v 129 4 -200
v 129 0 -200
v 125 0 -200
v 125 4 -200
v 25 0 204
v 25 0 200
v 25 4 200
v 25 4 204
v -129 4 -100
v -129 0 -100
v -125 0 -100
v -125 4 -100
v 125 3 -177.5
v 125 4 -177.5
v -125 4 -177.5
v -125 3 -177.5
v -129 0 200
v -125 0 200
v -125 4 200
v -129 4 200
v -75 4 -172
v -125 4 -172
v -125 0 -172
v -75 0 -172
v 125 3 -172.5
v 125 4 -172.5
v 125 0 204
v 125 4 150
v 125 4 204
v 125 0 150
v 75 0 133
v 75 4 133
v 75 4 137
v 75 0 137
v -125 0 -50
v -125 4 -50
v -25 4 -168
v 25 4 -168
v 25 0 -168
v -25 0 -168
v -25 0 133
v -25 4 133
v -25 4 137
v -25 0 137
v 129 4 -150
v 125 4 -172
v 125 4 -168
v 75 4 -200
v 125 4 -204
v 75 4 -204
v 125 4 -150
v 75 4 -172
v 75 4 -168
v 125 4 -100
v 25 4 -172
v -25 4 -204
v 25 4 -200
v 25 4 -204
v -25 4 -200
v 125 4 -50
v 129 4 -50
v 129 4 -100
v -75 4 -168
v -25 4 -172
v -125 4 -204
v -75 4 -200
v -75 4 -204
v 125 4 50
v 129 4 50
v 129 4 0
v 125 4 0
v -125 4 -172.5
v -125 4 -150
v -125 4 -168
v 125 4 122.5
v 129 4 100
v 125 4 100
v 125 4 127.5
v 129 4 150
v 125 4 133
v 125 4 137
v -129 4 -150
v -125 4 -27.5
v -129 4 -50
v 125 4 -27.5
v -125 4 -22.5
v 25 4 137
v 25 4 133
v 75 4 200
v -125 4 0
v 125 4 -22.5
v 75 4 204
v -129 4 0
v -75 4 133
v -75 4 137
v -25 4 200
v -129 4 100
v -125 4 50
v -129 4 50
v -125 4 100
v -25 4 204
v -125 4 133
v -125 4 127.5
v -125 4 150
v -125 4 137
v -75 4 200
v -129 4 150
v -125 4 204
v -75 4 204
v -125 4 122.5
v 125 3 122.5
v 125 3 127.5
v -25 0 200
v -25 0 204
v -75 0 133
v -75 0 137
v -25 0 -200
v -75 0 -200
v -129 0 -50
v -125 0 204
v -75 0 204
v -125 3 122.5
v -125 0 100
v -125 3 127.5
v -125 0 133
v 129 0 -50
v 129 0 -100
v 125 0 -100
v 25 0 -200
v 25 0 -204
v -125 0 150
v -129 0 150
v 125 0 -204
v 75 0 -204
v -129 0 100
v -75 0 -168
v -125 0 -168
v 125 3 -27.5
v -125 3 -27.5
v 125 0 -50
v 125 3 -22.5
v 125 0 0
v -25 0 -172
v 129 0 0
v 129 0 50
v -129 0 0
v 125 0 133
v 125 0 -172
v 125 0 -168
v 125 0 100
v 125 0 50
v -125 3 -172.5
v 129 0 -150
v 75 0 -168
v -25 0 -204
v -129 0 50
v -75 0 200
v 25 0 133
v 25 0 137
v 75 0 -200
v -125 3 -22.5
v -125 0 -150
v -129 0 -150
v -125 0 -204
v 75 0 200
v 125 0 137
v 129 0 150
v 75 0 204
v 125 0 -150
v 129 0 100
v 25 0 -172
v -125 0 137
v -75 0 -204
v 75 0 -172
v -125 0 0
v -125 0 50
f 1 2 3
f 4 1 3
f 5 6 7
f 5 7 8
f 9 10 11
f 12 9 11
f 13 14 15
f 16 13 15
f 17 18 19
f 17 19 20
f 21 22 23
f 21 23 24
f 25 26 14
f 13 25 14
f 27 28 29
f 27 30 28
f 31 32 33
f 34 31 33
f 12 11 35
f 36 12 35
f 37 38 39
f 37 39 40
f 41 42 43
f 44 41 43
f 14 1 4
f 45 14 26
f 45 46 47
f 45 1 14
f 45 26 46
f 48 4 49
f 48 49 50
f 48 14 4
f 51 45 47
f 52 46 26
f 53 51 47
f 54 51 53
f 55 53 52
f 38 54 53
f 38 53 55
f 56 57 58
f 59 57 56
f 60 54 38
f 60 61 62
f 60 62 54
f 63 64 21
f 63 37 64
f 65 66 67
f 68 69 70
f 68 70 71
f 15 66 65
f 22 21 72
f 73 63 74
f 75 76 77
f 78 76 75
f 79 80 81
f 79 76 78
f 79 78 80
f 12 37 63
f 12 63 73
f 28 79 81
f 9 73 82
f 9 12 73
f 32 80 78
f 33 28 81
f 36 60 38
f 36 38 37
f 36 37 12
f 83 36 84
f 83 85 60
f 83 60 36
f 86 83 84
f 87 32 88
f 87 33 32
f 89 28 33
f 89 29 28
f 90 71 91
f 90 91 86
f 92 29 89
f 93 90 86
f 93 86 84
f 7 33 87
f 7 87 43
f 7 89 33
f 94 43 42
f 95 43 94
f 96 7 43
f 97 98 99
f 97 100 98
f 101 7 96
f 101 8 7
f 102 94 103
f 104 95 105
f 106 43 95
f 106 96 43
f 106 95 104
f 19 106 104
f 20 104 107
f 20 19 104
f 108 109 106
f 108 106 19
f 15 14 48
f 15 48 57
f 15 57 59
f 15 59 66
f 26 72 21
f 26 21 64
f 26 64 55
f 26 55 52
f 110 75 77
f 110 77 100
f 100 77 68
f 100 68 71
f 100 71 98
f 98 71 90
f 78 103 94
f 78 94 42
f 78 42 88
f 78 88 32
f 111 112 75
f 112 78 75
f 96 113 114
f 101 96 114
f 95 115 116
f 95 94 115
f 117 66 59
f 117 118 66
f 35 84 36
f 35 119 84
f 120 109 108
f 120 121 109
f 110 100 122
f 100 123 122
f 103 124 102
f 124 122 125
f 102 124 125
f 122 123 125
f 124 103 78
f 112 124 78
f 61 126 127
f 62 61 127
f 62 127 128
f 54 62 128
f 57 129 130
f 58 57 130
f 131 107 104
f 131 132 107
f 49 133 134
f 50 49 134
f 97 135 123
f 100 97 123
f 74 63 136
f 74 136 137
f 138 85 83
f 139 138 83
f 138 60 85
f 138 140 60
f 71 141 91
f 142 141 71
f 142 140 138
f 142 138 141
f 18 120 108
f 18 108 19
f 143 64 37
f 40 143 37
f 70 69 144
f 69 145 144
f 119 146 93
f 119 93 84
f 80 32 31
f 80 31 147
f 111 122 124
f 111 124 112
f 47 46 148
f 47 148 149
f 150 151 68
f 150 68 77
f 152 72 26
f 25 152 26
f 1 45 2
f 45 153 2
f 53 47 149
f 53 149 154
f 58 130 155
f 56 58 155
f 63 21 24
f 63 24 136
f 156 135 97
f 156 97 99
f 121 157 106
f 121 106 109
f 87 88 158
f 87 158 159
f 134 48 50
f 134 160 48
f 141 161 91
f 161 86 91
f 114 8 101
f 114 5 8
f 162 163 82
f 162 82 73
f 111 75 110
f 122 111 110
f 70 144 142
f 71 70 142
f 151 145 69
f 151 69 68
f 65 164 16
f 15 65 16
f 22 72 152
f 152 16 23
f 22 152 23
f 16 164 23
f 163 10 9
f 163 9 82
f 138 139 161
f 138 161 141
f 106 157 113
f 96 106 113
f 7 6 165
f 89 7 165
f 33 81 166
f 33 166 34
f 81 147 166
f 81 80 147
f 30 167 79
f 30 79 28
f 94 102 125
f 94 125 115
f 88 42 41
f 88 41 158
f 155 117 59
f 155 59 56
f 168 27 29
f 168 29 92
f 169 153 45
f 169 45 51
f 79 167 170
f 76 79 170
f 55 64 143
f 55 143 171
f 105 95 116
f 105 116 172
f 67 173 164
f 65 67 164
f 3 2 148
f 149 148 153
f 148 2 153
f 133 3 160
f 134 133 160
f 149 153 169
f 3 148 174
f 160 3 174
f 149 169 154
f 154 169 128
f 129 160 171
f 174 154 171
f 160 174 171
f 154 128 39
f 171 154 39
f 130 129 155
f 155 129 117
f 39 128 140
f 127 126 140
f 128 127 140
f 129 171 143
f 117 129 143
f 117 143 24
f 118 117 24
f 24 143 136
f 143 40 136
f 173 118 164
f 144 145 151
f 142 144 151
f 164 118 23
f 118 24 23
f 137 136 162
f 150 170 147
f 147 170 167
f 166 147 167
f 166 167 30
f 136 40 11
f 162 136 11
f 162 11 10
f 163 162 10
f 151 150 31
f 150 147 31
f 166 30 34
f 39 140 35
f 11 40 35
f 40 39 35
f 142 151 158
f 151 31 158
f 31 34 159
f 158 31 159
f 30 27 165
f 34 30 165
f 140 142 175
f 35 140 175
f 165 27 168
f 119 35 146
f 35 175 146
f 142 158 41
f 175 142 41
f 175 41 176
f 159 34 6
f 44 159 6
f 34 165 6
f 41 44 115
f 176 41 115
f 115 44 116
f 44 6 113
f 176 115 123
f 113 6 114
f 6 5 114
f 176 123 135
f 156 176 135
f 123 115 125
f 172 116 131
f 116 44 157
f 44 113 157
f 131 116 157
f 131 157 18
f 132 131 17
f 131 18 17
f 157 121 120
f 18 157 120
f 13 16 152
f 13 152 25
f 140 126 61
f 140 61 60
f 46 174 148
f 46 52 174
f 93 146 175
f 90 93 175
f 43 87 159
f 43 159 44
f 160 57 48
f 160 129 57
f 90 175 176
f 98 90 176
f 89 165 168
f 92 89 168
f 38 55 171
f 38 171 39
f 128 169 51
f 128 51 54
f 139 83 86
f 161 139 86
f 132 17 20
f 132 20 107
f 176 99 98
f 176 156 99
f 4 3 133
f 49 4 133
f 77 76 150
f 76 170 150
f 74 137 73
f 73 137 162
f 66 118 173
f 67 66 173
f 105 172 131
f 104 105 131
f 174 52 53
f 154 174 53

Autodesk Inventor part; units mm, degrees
ref_plane "YZ Plane" through (0, 0, 0) normal (1, 0, 0) x (0, 1, 0)
ref_plane "XZ Plane" through (0, 0, 0) normal (0, 1, 0) x (-1, 0, 0)
ref_plane "XY Plane" through (0, 0, 0) normal (0, 0, 1) x (1, 0, 0)
sketch "Sketch1" plane through (0, 0, 0) normal (0, 1, 0) x (-1, 0, 0)
  line L0 (-125, 200) -> (125, 200) construction
  line L1 (125, 200) -> (125, -200) construction
  line L2 (125, -200) -> (-125, -200) construction
  line L3 (-125, -200) -> (-125, 200) construction
  line L4 (-125, 200) -> (125, -200) construction
  line L5 (125, 200) -> (-125, -200) construction
  line L6 (125, 200) -> (75, 200) construction
  line L7 (75, 200) -> (75, 204)
  line L8 (75, 204) -> (125, 204)
  line L9 (125, 204) -> (125, 200)
  line L10 (125, 200) -> (129, 200)
  line L11 (129, 200) -> (129, 150)
  line L12 (129, 150) -> (125, 150)
  line L13 (125, 150) -> (125, 200) construction
  line L14 (-125, 200) -> (-129, 200) construction
  line L15 (-129, 200) -> (-129, 150) construction
  line L16 (-129, 150) -> (-125, 150)
  line L17 (-125, 150) -> (-125, 200)
  line L18 (125, -200) -> (75, -200) construction
  line L19 (75, -200) -> (75, -204)
  line L20 (75, -204) -> (125, -204)
  line L21 (125, -204) -> (125, -200)
  line L22 (125, 100) -> (125, 150)
  line L23 (125, 150) -> (129, 150)
  line L24 (129, 100) -> (125, 100)
  line L25 (129, 150) -> (129, 100) construction
  line L26 (-125, 100) -> (-125, 150) construction
  line L27 (-125, 150) -> (-129, 150)
  line L28 (-129, 150) -> (-129, 100)
  line L29 (-129, 100) -> (-125, 100)
  line L30 (125, 50) -> (125, 100) construction
  line L31 (125, 100) -> (129, 100)
  line L32 (129, 50) -> (125, 50)
  line L33 (129, 100) -> (129, 50)
  line L34 (-125, 50) -> (-125, 100)
  line L35 (-125, 100) -> (-129, 100)
  line L36 (-129, 100) -> (-129, 50) construction
  line L37 (-129, 50) -> (-125, 50)
  line L38 (125, 0) -> (125, 50)
  line L39 (125, 50) -> (129, 50)
  line L40 (129, 0) -> (125, 0)
  line L41 (129, 50) -> (129, 0) construction
  line L42 (-125, 0) -> (-125, 50) construction
  line L43 (-125, 50) -> (-129, 50)
  line L44 (-129, 50) -> (-129, 0)
  line L45 (-129, 0) -> (-125, 0)
  line L46 (125, -50) -> (125, 0) construction
  line L47 (125, 0) -> (129, 0)
  line L48 (129, -50) -> (125, -50)
  line L49 (129, 0) -> (129, -50)
  line L50 (-125, -50) -> (-125, 0)
  line L51 (-125, 0) -> (-129, 0)
  line L52 (-129, 0) -> (-129, -50) construction
  line L53 (-129, -50) -> (-125, -50)
  line L54 (125, -100) -> (125, -50)
  line L55 (125, -50) -> (129, -50)
  line L56 (129, -100) -> (125, -100)
  line L57 (129, -50) -> (129, -100) construction
  line L58 (-125, -100) -> (-125, -50) construction
  line L59 (-125, -50) -> (-129, -50)
  line L60 (-129, -50) -> (-129, -100)
  line L61 (-129, -100) -> (-125, -100)
  line L62 (125, -150) -> (125, -100) construction
  line L63 (125, -100) -> (129, -100)
  line L64 (129, -150) -> (125, -150)
  line L65 (129, -100) -> (129, -150)
  line L66 (-125, -150) -> (-125, -100)
  line L67 (-125, -100) -> (-129, -100)
  line L68 (-129, -100) -> (-129, -150) construction
  line L69 (-129, -150) -> (-125, -150)
  line L70 (125, -200) -> (125, -150)
  line L71 (125, -150) -> (129, -150)
  line L72 (129, -200) -> (125, -200) construction
  line L73 (129, -150) -> (129, -200) construction
  line L74 (-125, -200) -> (-125, -150) construction
  line L75 (-125, -150) -> (-129, -150)
  line L76 (-129, -150) -> (-129, -200)
  line L77 (-129, -200) -> (-125, -200)
  line L78 (75, 204) -> (75, 200)
  line L79 (25, 200) -> (25, 204)
  line L80 (25, 204) -> (75, 204) construction
  line L81 (75, 200) -> (25, 200)
  line L82 (75, -200) -> (25, -200)
  line L83 (25, -200) -> (25, -204)
  line L84 (25, -204) -> (75, -204) construction
  line L85 (75, -204) -> (75, -200)
  line L86 (25, 204) -> (25, 200)
  line L87 (-25, 200) -> (-25, 204)
  line L88 (-25, 204) -> (25, 204)
  line L89 (25, 200) -> (-25, 200) construction
  line L90 (25, -200) -> (-25, -200) construction
  line L91 (-25, -200) -> (-25, -204)
  line L92 (-25, -204) -> (25, -204)
  line L93 (25, -204) -> (25, -200)
  line L94 (-25, 204) -> (-25, 200)
  line L95 (-75, 200) -> (-75, 204)
  line L96 (-75, 204) -> (-25, 204) construction
  line L97 (-25, 200) -> (-75, 200)
  line L98 (-25, -200) -> (-75, -200)
  line L99 (-75, -200) -> (-75, -204)
  line L100 (-75, -204) -> (-25, -204) construction
  line L101 (-25, -204) -> (-25, -200)
  line L102 (-75, 204) -> (-75, 200)
  line L103 (-125, 200) -> (-125, 204)
  line L104 (-125, 204) -> (-75, 204)
  line L105 (-75, 200) -> (-125, 200) construction
  line L106 (-75, -200) -> (-125, -200) construction
  line L107 (-125, -200) -> (-125, -204)
  line L108 (-125, -204) -> (-75, -204)
  line L109 (-75, -204) -> (-75, -200)
  point P0 (0, 0)
  dimension "d0" = 250
  dimension "d1" = 400
  dimension "d2" = 50
  dimension "d3" = 4
  dimension "d4" = 4
  dimension "d5" = 50
  dimension "d6" = 4
  dimension "d7" = 50
  dimension "d8" = 50
  dimension "d9" = 4
  dimension "d12" = 50
  dimension "d19" = 50
extrude "Extrusion1" add sketch "Sketch1" along normal blind 4
sketch "Sketch3" plane through (0, 4, 0) normal (0, 1, 0) x (1, 0, 0)
  line L0 (-129, 50) -> (-129, 0) projected
  line L1 (-129, 25) -> (125, 25) construction
  line L2 (125, 0) -> (125, 50) projected
  line L3 (-129, 22.5) -> (125, 22.5)
  line L4 (125, 22.5) -> (125, 27.5)
  line L5 (125, 27.5) -> (-129, 27.5)
  line L6 (-129, 27.5) -> (-129, 22.5)
  line L7 (-129, 27.5) -> (-125, 27.5)
  line L8 (-125, 27.5) -> (-125, 22.5)
  line L9 (-125, 22.5) -> (-129, 22.5)
  line L10 (-129, 22.5) -> (-129, 27.5)
  line L11 (-25, -200) -> (-25, -204) projected
  line L12 (-25, -204) -> (25, -204) projected
  line L13 (25, -204) -> (25, -200) projected
  line L14 (25, -200) -> (75, -200) projected
  line L15 (75, -200) -> (75, -204) projected
  line L16 (75, -204) -> (125, -204) projected
  line L17 (125, -204) -> (125, -150) projected
  line L18 (125, -150) -> (129, -150) projected
  line L19 (129, -150) -> (129, -100) projected
  line L20 (129, -100) -> (125, -100) projected
  line L21 (125, -100) -> (125, -50) projected
  line L22 (125, -50) -> (129, -50) projected
  line L23 (129, -50) -> (129, 0) projected
  line L24 (129, 0) -> (125, 0) projected
  line L25 (125, 0) -> (125, 50) projected
  line L26 (125, 50) -> (129, 50) projected
  line L27 (129, 50) -> (129, 100) projected
  line L28 (129, 100) -> (125, 100) projected
  line L29 (125, 100) -> (125, 150) projected
  line L30 (125, 150) -> (129, 150) projected
  line L31 (129, 150) -> (129, 200) projected
  line L32 (129, 200) -> (125, 200) projected
  line L33 (125, 200) -> (125, 204) projected
  line L34 (125, 204) -> (75, 204) projected
  line L35 (75, 204) -> (75, 200) projected
  line L36 (75, 200) -> (25, 200) projected
  line L37 (25, 200) -> (25, 204) projected
  line L38 (25, 204) -> (-25, 204) projected
  line L39 (-25, 204) -> (-25, 200) projected
  line L40 (-25, 200) -> (-75, 200) projected
  line L41 (-75, 200) -> (-75, 204) projected
  line L42 (-75, 204) -> (-125, 204) projected
  line L43 (-125, 204) -> (-125, 150) projected
  line L44 (-125, 150) -> (-129, 150) projected
  line L45 (-129, 150) -> (-129, 100) projected
  line L46 (-129, 100) -> (-125, 100) projected
  line L47 (-125, 100) -> (-125, 50) projected
  line L48 (-125, 50) -> (-129, 50) projected
  line L49 (-129, 50) -> (-129, 0) projected
  line L50 (-129, 0) -> (-125, 0) projected
  line L51 (-125, 0) -> (-125, -50) projected
  line L52 (-125, -50) -> (-129, -50) projected
  line L53 (-129, -50) -> (-129, -100) projected
  line L54 (-129, -100) -> (-125, -100) projected
  line L55 (-125, -100) -> (-125, -150) projected
  line L56 (-125, -150) -> (-129, -150) projected
  line L57 (-129, -150) -> (-129, -200) projected
  line L58 (-129, -200) -> (-125, -200) projected
  line L59 (-125, -200) -> (-125, -204) projected
  line L60 (-125, -204) -> (-75, -204) projected
  line L61 (-75, -204) -> (-75, -200) projected
  line L62 (-75, -200) -> (-25, -200) projected
  line L63 (-125, -100) -> (-125, -150) projected
  line L64 (-125, -125) -> (129, -125) construction
  line L65 (129, -150) -> (129, -100) projected
  line L66 (-125, -127.5) -> (125, -127.5)
  line L67 (125, -127.5) -> (125, -122.5)
  line L68 (125, -122.5) -> (-125, -122.5)
  line L69 (-125, -122.5) -> (-125, -127.5)
  line L70 (-125, -127.5) -> (125, -122.5) construction
  line L71 (125, -127.5) -> (-125, -122.5) construction
  line L72 (125, 0) -> (125, 50) projected
  line L73 (-125, 0) -> (-125, -50) projected
  line L74 (129, 150) -> (129, 200) projected
  line L75 (129, 175) -> (-125, 175) construction
  line L76 (-125, 172.5) -> (125, 172.5)
  line L77 (125, 172.5) -> (125, 177.5)
  line L78 (125, 177.5) -> (-125, 177.5)
  line L79 (-125, 177.5) -> (-125, 172.5)
  line L80 (-125, 172.5) -> (125, 177.5) construction
  line L81 (125, 172.5) -> (-125, 177.5) construction
  line L82 (-125, 204) -> (-125, 150) projected
  line L83 (125, 100) -> (125, 150) projected
  point P0 (0, 0)
  point P1 (-125, 27.5)
  point P2 (-125, 22.5)
  point P3 (0, -125)
  point P4 (0, 175)
  dimension "d30" = 5
  dimension "d34" = 5
  dimension "d35" = 5
  dimension "d36" = 5
extrude "Extrusion2" cut sketch "Sketch3" against normal blind 1 contours L5 L2 L3 L8 | L43 L78 L77 L76 | L68 L67 L66 L55
sketch "Sketch4" plane through (0, 4, 0) normal (0, 1, 0) x (1, 0, 0)
  line L0 (-125, -133) -> (-75, -133)
  line L1 (-75, -133) -> (-75, -137)
  line L2 (-75, -137) -> (-125, -137)
  line L3 (-125, -137) -> (-125, -133)
  line L4 (-75, -200) -> (-25, -200) projected
  line L5 (125, -127.5) -> (-125, -127.5) projected
  line L6 (-75, -133) -> (-25, -133)
  line L7 (-25, -133) -> (-25, -137)
  line L8 (-25, -137) -> (-75, -137)
  line L9 (-75, -137) -> (-75, -133)
  line L10 (-25, -133) -> (25, -133)
  line L11 (25, -133) -> (25, -137)
  line L12 (25, -137) -> (-25, -137)
  line L13 (-25, -137) -> (-25, -133)
  line L14 (25, -133) -> (75, -133)
  line L15 (75, -133) -> (75, -137)
  line L16 (75, -137) -> (25, -137)
  line L17 (25, -137) -> (25, -133)
  line L18 (75, -133) -> (125, -133)
  line L19 (125, -133) -> (125, -137)
  line L20 (125, -137) -> (75, -137)
  line L21 (75, -137) -> (75, -133)
  line L22 (-125, 0) -> (-125, -50) projected
  line L23 (-125, 172) -> (-75, 172)
  line L24 (-75, 172) -> (-75, 168)
  line L25 (-75, 168) -> (-125, 168)
  line L26 (-125, 168) -> (-125, 172)
  line L27 (-75, 172) -> (-25, 172)
  line L28 (-25, 172) -> (-25, 168)
  line L29 (-25, 168) -> (-25, 172)
  line L30 (-25, 168) -> (-75, 168)
  line L31 (-75, 168) -> (-75, 172)
  line L32 (-25, 172) -> (25, 172)
  line L33 (25, 168) -> (-25, 168)
  line L34 (25, 172) -> (25, 168)
  line L35 (25, 168) -> (25, 172)
  line L36 (25, 172) -> (75, 172)
  line L37 (75, 172) -> (75, 168)
  line L38 (75, 168) -> (75, 172)
  line L39 (75, 172) -> (125, 172)
  line L40 (125, 172) -> (125, 168)
  line L41 (125, 168) -> (75, 168)
  line L42 (75, 168) -> (25, 168)
  point P0 (0, 0)
  point P1 (-125, -135)
  point P2 (-125, -122.5)
  point P3 (-75, -135)
  point P4 (-25, -135)
  point P5 (25, -135)
  point P6 (75, -135)
  point P7 (75, -133)
  point P8 (-25, -133)
  point P9 (-125, 170)
  point P10 (-25, 170)
  point P11 (-75, 170)
  point P12 (25, 170)
  point P13 (75, 170)
  dimension "d37" = 50
  dimension "d38" = 4
  dimension "d39" = 63
  dimension "d42" = 50
  dimension "d51" = 305
extrude "Extrusion3" cut sketch "Sketch4" against normal up to next contours L0 L1 L2 L3 | L10 L11 L12 L7 | L18 L19 L20 L15 | L23 L24 L25 L26 | L32 L34 L33 L28 | L39 L40 L41 L37
properties part number "Wall_V1"
